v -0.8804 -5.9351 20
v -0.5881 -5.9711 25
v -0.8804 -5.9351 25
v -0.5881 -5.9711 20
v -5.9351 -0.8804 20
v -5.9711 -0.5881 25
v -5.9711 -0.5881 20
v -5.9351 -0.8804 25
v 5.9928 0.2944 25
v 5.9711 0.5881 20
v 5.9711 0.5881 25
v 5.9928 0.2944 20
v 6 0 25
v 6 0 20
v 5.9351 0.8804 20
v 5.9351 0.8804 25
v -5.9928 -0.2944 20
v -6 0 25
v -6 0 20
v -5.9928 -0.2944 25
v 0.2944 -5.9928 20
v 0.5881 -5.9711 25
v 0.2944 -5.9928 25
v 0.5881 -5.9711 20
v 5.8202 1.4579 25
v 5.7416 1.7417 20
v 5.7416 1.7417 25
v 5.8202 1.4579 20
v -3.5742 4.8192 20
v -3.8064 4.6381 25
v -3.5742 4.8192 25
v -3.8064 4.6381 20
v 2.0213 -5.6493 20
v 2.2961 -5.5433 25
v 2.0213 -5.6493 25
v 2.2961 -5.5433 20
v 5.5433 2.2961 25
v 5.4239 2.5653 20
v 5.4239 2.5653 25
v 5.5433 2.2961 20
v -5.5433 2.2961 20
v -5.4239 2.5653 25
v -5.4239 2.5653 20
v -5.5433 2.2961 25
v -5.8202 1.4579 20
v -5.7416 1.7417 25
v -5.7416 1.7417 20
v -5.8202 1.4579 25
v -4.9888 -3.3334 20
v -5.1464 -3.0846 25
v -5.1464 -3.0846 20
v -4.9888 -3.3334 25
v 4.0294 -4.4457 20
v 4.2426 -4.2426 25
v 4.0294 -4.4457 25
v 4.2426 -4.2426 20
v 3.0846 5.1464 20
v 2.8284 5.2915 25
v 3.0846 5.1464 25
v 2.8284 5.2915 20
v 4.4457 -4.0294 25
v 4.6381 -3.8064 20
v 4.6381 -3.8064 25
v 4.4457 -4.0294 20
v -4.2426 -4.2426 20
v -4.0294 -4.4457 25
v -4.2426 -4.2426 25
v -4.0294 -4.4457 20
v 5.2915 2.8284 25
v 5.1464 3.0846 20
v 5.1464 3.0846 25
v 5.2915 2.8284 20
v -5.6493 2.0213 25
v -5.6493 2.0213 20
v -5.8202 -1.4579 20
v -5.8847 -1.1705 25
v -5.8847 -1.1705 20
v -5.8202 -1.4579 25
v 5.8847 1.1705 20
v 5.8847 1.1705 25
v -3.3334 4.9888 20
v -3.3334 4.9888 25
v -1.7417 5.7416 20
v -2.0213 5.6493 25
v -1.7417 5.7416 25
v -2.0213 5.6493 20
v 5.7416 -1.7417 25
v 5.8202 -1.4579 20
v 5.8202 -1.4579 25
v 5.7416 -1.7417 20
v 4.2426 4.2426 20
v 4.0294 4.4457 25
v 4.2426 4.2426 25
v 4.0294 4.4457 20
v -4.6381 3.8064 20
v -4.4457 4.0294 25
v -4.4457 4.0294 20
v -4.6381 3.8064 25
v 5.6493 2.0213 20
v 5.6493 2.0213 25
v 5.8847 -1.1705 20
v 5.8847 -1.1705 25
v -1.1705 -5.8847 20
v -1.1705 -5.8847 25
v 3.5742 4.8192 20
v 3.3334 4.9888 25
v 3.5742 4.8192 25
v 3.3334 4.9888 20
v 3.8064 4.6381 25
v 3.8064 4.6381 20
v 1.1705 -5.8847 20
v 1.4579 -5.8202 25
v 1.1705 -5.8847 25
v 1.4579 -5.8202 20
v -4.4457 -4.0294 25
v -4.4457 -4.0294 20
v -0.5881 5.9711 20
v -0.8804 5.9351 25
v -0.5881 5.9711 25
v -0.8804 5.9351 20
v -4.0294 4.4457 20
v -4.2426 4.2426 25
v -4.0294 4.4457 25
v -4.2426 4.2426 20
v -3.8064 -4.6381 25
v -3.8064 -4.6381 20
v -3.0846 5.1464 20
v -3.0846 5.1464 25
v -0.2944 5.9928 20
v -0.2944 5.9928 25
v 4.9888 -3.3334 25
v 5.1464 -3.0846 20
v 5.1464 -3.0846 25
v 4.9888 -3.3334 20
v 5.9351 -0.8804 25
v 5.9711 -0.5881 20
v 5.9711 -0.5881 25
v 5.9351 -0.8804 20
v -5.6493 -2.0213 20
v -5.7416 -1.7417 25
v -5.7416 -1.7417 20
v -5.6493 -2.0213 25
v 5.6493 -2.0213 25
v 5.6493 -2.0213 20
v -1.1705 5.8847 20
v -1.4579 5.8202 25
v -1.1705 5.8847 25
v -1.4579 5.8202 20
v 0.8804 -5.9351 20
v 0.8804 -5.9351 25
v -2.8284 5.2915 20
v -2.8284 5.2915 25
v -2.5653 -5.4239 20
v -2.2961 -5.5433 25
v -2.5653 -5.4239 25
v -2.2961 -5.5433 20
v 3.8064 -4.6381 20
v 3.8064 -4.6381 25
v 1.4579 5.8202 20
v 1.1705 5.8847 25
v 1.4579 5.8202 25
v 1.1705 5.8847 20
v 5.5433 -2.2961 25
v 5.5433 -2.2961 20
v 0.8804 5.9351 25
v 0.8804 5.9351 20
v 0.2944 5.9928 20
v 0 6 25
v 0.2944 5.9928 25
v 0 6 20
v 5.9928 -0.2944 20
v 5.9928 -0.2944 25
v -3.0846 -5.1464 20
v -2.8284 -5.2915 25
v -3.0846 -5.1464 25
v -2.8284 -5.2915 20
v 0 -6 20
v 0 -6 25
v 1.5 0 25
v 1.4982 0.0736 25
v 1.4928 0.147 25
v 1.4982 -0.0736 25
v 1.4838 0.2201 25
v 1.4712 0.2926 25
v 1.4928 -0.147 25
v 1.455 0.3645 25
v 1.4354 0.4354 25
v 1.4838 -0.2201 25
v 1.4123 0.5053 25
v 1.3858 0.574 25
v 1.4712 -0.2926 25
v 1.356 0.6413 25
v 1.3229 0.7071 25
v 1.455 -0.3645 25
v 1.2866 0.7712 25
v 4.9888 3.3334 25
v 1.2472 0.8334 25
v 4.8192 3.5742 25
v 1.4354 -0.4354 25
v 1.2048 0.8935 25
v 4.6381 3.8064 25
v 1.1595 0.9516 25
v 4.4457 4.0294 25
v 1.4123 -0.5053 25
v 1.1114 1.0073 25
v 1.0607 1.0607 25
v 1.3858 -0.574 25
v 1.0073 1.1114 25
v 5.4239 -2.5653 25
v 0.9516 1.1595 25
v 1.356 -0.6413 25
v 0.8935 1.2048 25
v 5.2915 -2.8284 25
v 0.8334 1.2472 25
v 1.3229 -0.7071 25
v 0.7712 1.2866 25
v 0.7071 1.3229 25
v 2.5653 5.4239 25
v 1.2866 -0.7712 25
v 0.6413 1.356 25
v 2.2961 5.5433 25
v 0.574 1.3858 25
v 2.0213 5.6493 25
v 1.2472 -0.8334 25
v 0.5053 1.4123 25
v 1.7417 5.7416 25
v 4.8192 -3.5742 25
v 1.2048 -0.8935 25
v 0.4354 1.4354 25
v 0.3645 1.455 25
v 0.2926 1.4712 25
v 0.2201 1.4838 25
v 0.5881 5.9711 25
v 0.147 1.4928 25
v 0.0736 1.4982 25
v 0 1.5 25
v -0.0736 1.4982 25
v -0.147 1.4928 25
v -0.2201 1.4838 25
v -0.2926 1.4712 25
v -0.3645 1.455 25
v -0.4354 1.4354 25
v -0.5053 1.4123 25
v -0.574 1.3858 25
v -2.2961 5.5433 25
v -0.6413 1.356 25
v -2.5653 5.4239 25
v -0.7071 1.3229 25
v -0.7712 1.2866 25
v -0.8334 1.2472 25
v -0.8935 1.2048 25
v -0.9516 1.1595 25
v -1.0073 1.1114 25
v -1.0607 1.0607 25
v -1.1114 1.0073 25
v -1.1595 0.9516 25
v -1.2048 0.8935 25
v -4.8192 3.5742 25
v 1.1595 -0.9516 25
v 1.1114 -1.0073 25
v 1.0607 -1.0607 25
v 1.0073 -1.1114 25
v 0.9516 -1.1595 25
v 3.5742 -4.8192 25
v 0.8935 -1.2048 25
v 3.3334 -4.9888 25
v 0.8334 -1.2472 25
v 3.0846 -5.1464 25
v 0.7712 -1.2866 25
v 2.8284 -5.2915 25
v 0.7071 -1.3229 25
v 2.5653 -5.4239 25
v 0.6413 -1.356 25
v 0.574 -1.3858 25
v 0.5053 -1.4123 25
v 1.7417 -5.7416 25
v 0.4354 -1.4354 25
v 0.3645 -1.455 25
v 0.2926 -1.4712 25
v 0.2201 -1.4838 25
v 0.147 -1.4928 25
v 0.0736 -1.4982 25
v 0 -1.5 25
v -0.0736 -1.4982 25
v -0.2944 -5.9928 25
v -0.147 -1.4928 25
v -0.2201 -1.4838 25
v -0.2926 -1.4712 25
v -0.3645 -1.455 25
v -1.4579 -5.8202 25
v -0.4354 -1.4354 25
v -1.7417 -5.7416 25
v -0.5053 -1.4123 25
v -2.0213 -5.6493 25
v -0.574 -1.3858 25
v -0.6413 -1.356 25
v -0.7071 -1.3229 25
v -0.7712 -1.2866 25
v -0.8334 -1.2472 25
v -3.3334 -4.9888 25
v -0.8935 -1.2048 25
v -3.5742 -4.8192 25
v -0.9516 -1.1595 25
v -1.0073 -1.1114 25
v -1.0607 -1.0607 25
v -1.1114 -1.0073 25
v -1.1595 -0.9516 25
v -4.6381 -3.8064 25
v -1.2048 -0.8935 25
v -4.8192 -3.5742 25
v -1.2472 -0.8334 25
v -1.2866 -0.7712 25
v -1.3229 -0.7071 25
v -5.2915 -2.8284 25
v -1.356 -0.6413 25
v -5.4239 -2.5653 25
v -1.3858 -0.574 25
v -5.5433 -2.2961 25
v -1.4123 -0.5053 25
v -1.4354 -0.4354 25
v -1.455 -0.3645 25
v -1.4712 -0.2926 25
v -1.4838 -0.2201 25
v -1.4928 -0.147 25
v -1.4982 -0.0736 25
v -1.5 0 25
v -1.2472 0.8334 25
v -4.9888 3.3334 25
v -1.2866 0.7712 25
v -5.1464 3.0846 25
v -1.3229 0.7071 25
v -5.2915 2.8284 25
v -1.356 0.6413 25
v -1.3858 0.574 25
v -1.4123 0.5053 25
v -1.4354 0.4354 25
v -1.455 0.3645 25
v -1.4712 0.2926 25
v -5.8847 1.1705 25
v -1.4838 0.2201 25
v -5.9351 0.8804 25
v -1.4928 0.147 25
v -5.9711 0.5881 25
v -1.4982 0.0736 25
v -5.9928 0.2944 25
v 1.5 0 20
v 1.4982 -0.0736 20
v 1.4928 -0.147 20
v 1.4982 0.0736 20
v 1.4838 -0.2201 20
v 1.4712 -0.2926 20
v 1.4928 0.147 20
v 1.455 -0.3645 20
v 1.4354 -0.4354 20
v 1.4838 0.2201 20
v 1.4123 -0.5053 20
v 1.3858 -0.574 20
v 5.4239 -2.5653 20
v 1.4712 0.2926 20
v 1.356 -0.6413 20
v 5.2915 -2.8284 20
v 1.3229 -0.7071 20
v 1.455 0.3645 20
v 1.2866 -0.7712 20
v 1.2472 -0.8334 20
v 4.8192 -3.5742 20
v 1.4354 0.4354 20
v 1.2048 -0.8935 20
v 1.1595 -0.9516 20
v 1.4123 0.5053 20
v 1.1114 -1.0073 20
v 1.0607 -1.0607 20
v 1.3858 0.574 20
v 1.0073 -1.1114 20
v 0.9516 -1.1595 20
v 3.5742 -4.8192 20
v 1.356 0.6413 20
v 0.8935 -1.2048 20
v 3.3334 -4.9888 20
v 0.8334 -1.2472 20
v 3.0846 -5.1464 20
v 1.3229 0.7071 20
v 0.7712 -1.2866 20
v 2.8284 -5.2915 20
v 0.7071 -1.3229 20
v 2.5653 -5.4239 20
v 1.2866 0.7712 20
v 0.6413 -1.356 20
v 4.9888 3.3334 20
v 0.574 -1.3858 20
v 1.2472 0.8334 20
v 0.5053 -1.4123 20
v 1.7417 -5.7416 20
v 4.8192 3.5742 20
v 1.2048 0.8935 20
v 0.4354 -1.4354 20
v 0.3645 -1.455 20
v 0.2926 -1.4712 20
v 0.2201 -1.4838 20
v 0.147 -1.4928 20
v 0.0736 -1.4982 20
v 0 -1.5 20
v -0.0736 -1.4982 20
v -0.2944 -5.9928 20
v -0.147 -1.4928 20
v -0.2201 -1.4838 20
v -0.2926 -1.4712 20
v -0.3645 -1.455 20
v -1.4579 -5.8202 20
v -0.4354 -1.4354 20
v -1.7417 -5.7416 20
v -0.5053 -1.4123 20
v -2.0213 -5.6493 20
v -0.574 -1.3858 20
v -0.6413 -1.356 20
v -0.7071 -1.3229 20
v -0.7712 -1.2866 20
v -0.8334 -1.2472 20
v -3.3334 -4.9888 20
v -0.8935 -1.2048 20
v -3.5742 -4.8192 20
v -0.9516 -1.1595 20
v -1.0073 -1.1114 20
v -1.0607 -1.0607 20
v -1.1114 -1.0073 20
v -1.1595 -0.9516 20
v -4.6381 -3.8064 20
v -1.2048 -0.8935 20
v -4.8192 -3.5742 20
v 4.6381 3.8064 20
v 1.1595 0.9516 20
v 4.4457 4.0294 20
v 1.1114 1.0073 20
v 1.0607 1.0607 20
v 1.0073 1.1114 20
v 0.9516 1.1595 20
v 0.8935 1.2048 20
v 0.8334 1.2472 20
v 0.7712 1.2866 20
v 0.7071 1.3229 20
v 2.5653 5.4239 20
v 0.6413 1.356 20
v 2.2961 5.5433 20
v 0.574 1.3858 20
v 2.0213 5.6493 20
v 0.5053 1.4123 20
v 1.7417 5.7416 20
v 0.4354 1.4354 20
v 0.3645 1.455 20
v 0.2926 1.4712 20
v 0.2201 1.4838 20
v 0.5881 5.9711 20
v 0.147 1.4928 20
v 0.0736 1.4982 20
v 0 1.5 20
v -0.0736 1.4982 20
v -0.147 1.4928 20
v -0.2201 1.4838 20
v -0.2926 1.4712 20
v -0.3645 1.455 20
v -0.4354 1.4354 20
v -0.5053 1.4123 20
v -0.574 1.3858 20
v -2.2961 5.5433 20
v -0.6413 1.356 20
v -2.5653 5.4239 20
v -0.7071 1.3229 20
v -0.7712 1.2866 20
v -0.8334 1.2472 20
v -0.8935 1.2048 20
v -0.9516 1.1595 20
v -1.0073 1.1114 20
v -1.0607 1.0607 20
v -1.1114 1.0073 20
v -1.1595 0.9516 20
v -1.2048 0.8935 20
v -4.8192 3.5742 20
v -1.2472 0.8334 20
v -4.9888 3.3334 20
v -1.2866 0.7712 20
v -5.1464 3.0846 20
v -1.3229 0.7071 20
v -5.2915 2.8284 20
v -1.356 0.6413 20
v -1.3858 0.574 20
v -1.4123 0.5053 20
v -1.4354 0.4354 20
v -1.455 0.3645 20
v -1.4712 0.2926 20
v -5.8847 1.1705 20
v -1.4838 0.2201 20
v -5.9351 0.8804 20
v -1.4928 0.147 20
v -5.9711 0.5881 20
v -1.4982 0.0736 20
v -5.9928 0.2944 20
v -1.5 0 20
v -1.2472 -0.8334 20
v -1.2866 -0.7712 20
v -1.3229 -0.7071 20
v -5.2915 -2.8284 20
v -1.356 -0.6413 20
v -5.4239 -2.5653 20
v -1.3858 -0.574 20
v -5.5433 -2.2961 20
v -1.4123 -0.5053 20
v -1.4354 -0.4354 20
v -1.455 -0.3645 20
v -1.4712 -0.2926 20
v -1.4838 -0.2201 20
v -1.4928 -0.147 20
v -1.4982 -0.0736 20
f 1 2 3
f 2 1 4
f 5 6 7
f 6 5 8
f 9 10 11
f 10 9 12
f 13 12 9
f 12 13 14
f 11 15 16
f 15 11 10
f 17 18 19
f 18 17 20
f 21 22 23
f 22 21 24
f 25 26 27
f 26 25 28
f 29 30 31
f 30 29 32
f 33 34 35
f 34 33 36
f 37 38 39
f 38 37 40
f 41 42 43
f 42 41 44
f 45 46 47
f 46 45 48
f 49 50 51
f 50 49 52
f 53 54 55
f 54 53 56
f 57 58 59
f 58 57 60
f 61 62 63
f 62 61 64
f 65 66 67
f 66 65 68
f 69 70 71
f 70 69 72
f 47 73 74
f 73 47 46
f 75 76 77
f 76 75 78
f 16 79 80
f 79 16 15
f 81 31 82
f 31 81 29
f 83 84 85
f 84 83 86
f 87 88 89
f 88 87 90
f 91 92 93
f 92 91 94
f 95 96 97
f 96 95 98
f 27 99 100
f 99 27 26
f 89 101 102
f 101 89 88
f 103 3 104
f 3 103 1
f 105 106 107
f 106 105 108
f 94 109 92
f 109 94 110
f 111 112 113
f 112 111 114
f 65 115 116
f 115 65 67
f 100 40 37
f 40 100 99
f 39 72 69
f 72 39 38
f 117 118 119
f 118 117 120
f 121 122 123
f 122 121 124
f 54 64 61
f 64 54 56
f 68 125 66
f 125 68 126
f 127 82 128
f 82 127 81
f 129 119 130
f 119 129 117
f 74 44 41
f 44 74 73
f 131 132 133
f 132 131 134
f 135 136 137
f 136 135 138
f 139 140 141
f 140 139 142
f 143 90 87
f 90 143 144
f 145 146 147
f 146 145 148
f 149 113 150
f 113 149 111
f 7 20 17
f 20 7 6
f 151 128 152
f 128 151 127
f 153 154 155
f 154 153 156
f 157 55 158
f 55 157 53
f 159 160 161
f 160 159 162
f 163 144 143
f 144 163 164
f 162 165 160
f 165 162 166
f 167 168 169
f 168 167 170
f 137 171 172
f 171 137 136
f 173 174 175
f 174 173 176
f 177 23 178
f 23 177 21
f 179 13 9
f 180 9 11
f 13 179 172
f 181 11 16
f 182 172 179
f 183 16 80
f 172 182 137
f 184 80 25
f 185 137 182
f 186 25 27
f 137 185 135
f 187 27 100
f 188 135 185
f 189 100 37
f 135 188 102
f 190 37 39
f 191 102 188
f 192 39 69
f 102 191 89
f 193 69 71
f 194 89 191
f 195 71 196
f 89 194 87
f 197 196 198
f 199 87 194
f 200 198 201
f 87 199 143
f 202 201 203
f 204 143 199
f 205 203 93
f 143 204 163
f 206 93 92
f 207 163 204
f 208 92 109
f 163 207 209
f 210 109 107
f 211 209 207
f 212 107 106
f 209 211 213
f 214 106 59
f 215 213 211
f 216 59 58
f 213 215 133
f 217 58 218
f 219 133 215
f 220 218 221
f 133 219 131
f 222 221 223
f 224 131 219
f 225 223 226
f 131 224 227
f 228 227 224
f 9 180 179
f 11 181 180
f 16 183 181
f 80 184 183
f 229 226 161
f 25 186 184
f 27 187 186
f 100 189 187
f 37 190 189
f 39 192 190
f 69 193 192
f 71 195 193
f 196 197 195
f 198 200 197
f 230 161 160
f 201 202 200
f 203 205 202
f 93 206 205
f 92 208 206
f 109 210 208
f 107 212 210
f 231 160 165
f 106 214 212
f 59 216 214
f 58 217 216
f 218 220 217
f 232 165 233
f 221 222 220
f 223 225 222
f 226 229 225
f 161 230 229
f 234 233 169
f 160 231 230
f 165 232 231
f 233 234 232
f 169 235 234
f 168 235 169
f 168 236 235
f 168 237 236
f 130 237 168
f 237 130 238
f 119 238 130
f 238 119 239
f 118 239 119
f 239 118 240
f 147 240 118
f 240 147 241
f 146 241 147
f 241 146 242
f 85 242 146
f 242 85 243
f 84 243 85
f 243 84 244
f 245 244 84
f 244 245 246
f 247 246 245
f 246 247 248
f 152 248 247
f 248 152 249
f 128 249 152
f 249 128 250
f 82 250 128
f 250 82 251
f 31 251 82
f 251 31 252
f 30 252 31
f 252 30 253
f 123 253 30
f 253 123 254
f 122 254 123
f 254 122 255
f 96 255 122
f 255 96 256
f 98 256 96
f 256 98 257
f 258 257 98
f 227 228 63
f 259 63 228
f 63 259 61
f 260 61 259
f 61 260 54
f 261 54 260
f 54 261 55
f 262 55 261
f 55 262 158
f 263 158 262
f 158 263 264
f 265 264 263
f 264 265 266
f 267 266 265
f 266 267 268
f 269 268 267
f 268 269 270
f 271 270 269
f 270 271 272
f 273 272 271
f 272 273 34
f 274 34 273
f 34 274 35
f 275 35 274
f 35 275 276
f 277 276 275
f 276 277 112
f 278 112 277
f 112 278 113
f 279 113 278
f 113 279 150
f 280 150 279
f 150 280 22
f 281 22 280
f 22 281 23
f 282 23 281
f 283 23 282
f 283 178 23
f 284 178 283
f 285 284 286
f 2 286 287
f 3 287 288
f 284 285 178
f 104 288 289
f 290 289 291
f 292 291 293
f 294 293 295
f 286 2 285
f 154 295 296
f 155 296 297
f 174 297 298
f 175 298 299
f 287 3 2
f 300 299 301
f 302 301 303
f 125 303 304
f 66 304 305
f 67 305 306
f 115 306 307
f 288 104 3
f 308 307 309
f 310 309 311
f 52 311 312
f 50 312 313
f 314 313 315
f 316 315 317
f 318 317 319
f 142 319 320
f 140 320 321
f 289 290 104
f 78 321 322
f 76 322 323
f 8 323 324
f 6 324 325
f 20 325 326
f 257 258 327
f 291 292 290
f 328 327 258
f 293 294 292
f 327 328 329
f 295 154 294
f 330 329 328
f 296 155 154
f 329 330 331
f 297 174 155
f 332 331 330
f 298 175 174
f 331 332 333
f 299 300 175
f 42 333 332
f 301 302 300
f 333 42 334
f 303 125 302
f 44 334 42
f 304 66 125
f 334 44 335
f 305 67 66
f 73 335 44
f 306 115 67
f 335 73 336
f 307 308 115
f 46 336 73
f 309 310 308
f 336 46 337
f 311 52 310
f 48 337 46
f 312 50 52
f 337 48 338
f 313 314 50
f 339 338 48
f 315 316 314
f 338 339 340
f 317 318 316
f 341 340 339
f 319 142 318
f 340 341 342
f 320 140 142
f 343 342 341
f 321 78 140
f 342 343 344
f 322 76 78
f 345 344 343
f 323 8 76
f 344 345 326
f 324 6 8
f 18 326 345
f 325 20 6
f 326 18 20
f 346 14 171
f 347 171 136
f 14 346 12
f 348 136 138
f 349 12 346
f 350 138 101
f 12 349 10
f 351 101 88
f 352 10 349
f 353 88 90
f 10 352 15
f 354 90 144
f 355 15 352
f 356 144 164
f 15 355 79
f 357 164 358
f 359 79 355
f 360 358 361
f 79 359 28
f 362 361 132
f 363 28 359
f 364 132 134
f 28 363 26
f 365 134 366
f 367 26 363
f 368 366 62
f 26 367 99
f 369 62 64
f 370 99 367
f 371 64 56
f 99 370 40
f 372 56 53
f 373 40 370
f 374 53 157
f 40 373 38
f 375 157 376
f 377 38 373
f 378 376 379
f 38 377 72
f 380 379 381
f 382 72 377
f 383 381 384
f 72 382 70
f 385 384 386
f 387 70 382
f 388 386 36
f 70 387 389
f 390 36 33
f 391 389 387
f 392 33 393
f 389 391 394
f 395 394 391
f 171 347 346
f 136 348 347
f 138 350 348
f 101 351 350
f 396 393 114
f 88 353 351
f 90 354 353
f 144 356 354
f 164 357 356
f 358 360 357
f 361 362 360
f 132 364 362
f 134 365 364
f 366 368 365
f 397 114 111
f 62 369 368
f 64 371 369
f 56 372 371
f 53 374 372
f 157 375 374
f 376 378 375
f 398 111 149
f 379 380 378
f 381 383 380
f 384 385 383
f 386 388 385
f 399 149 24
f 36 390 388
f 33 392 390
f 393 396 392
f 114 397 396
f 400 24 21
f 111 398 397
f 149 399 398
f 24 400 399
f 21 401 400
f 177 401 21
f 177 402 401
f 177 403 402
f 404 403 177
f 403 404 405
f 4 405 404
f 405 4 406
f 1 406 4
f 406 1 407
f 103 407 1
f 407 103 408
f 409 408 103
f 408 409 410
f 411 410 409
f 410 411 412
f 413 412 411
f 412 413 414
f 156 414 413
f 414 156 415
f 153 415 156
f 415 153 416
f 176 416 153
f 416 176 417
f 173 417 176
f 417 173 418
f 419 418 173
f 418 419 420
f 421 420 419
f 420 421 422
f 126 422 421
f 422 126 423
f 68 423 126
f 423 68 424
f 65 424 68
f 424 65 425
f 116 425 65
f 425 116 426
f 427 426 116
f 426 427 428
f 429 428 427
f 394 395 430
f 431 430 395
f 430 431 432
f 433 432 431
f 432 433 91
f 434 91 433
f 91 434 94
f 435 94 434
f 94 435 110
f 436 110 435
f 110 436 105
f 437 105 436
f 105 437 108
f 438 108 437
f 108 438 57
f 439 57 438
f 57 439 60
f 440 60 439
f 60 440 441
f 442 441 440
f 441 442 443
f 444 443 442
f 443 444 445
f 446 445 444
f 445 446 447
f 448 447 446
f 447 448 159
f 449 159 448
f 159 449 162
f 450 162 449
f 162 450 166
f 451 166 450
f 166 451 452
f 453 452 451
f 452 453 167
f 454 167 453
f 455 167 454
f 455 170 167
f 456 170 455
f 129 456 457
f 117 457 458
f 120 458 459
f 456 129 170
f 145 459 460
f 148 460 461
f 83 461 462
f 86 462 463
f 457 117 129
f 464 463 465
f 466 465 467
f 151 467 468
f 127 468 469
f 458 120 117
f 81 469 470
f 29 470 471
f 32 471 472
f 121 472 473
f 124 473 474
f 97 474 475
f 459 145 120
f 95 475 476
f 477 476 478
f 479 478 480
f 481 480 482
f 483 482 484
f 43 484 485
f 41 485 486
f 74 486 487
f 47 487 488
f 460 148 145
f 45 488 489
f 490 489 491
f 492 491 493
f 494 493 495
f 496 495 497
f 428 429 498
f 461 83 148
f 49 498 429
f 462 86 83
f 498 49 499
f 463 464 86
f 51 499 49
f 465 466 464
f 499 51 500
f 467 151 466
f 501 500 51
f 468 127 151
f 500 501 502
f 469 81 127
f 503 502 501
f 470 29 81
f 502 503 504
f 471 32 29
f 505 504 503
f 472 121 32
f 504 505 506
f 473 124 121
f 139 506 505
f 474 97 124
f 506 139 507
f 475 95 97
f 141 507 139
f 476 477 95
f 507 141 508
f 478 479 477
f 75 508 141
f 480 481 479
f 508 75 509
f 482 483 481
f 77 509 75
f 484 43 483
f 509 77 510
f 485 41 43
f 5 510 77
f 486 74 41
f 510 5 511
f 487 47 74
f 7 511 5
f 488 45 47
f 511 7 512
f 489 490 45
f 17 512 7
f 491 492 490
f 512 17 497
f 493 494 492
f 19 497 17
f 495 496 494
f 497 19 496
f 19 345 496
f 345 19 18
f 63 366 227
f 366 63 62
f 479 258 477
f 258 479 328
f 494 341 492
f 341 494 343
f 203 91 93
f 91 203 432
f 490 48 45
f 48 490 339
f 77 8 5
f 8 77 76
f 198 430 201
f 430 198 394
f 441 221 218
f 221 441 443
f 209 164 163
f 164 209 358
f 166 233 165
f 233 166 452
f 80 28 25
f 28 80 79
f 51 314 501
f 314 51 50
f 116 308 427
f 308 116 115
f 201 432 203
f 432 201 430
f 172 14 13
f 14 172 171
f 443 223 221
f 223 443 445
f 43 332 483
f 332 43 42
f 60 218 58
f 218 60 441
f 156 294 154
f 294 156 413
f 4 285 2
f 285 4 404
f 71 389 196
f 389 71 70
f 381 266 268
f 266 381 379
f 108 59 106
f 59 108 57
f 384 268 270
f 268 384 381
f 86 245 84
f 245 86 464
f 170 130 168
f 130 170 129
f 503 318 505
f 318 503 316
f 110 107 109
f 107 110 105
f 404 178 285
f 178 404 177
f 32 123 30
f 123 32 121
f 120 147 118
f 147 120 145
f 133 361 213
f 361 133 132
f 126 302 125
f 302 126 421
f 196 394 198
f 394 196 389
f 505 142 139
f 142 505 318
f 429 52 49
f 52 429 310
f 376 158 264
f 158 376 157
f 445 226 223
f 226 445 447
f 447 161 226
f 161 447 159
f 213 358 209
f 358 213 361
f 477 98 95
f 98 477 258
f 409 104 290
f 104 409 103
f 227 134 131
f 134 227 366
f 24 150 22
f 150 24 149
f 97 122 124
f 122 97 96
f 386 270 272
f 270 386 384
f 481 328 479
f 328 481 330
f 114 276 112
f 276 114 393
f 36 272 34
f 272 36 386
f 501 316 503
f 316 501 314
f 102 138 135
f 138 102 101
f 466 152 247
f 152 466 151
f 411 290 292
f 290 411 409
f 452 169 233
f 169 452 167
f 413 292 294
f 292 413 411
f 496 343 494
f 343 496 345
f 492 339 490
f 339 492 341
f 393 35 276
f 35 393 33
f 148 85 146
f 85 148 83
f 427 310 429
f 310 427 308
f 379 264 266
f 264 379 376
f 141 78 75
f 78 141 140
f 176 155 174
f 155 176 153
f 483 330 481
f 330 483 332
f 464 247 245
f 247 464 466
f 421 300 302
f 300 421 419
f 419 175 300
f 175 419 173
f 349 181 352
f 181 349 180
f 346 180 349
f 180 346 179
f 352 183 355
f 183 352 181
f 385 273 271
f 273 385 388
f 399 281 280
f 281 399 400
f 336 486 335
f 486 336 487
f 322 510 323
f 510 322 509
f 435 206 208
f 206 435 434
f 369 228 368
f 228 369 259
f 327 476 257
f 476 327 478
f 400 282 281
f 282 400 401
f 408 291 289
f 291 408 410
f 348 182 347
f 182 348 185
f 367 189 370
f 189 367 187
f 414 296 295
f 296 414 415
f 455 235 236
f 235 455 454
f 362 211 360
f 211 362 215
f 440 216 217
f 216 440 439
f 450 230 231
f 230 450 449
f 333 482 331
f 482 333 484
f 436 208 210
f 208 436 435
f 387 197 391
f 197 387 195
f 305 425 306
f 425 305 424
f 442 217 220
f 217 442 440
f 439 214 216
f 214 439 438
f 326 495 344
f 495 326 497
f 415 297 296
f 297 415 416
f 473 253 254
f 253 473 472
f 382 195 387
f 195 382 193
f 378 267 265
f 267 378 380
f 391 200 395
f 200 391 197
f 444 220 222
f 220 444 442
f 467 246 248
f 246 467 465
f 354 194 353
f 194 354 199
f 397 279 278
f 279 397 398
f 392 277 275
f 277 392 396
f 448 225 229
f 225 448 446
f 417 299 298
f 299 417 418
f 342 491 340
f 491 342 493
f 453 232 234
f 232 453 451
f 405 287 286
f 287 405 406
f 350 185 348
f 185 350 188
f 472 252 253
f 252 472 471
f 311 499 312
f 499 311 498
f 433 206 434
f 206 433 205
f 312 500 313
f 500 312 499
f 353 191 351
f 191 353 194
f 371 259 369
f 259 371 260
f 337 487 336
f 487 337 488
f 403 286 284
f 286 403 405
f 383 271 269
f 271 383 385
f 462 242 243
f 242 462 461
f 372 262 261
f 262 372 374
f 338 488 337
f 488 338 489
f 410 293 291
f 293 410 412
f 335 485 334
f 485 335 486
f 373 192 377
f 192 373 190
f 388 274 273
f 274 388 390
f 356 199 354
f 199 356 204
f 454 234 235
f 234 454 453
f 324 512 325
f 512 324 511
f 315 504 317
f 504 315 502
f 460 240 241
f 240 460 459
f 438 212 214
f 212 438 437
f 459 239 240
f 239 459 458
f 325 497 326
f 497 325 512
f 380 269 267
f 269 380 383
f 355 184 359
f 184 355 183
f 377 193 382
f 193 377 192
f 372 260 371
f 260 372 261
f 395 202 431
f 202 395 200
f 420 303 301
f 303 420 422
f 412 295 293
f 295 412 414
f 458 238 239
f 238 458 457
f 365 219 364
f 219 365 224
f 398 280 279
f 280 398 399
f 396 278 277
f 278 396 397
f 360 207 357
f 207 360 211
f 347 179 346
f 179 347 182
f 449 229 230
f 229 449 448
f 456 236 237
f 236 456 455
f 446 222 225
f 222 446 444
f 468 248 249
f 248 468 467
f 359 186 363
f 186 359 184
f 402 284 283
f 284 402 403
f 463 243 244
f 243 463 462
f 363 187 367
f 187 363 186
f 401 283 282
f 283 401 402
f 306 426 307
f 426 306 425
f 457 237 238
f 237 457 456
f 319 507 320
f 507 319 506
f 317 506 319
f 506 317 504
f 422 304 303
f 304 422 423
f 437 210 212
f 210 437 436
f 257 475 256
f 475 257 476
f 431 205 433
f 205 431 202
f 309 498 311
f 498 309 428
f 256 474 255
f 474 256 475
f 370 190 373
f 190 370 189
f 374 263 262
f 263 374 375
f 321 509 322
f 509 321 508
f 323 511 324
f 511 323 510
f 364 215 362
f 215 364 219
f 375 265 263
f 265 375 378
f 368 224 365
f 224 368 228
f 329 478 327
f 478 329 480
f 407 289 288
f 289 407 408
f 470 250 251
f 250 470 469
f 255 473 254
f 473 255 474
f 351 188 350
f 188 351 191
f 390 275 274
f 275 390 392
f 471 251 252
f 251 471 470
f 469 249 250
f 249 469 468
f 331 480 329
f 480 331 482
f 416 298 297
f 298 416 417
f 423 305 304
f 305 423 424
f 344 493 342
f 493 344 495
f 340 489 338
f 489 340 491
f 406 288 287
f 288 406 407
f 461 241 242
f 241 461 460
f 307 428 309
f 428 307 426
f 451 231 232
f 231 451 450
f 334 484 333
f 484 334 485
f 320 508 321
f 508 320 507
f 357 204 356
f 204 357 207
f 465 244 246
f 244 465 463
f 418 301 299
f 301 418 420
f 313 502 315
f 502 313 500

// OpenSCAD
// Straight hose-barb reducer - joins 8mm ID tubing to 5mm ID tubing.
// Prints standing upright along Z, centred on origin.

$fn = 128;

// Dimensions
z_start = 0;
z_8mm_end = 20;
z_collar_start = 20;
z_collar_end = 25;
z_5mm_end = 41;

// 8mm Tubing Barbs (z = 0 to 20)
// Two stacked barbs, each 10mm tall.
// Profile: OD grows 7.5 -> 9.5, then steps back to 7.5.
barb_8_height = 10;
barb_8_bottom_od = 7.5;
barb_8_top_od = 9.5;
barb_8_step_od = 7.5;

// 5mm Tubing Barbs (z = 25 to 41)
// Two stacked barbs, each 8mm tall.
// Profile: OD shrinks 6.5 -> 5.0, then steps back to 6.5.
barb_5_height = 8;
barb_5_bottom_od = 6.5;
barb_5_top_od = 5.0;
barb_5_step_od = 6.5;

// Common features
bore_diameter = 3;
collar_diameter = 12;

// Generate the 8mm barb profile points for rotate_extrude
// We need the profile from z=0 to z=20.
// Barb 1: z=0 to 10. Barb 2: z=10 to 20.
// Each barb: OD grows linearly, then steps.
// Since we are extruding a 2D profile around Z, the profile is (radius, z).
// We define the profile from z=0 to z=20.

// Barb 1 (z=0 to 10):
// Radius starts at barb_8_bottom_od/2.
// At z=10, radius is barb_8_top_od/2.
// Then step down to barb_8_step_od/2 at z=10.
// Barb 2 (z=10 to 20):
// Radius starts at barb_8_step_od/2.
// At z=20, radius is barb_8_top_od/2.

// Construct the list of points for the 8mm section
// Format: [radius, z]
profile_8mm = [
    [barb_8_bottom_od / 2, 0],
    [barb_8_top_od / 2, barb_8_height],
    [barb_8_step_od / 2, barb_8_height],
    [barb_8_step_od / 2, 2 * barb_8_height],
    [barb_8_top_od / 2, 2 * barb_8_height]
];

// Generate the 5mm barb profile points for rotate_extrude
// Section z=25 to z=41.
// Barb 1: z=25 to 33. Barb 2: z=33 to 41.
// Each barb: OD shrinks linearly, then steps.
// Barb 1 (z=25 to 33):
// Radius starts at barb_5_bottom_od/2.
// At z=33, radius is barb_5_top_od/2.
// Then step down to barb_5_step_od/2 at z=33.
// Barb 2 (z=33 to 41):
// Radius starts at barb_5_step_od/2.
// At z=41, radius is barb_5_top_od/2.

profile_5mm = [
    [barb_5_bottom_od / 2, 25],
    [barb_5_top_od / 2, 25 + barb_5_height],
    [barb_5_step_od / 2, 25 + barb_5_height],
    [barb_5_step_od / 2, 25 + 2 * barb_5_height],
    [barb_5_top_od / 2, 25 + 2 * barb_5_height]
];

difference() {
    union() {
        // 8mm Barbs Section (z=0 to 20)
        rotate_extrude() linear_extrude(height = z_8mm_end - z_start) polygon(profile_8mm);

        // Collar Section (z=20 to 25)
        translate([0, 0, z_8mm_end]) cylinder(h = z_collar_end - z_8mm_end, d = collar_diameter);

        // 5mm Barbs Section (z=25 to 41)
        translate([0, 0, z_collar_end]) rotate_extrude() linear_extrude(height = z_5mm_end - z_collar_end) polygon(profile_5mm);
    }

    // Bore through the entire length
    translate([0, 0, -1]) cylinder(h = z_5mm_end + 2, d = bore_diameter);
}
